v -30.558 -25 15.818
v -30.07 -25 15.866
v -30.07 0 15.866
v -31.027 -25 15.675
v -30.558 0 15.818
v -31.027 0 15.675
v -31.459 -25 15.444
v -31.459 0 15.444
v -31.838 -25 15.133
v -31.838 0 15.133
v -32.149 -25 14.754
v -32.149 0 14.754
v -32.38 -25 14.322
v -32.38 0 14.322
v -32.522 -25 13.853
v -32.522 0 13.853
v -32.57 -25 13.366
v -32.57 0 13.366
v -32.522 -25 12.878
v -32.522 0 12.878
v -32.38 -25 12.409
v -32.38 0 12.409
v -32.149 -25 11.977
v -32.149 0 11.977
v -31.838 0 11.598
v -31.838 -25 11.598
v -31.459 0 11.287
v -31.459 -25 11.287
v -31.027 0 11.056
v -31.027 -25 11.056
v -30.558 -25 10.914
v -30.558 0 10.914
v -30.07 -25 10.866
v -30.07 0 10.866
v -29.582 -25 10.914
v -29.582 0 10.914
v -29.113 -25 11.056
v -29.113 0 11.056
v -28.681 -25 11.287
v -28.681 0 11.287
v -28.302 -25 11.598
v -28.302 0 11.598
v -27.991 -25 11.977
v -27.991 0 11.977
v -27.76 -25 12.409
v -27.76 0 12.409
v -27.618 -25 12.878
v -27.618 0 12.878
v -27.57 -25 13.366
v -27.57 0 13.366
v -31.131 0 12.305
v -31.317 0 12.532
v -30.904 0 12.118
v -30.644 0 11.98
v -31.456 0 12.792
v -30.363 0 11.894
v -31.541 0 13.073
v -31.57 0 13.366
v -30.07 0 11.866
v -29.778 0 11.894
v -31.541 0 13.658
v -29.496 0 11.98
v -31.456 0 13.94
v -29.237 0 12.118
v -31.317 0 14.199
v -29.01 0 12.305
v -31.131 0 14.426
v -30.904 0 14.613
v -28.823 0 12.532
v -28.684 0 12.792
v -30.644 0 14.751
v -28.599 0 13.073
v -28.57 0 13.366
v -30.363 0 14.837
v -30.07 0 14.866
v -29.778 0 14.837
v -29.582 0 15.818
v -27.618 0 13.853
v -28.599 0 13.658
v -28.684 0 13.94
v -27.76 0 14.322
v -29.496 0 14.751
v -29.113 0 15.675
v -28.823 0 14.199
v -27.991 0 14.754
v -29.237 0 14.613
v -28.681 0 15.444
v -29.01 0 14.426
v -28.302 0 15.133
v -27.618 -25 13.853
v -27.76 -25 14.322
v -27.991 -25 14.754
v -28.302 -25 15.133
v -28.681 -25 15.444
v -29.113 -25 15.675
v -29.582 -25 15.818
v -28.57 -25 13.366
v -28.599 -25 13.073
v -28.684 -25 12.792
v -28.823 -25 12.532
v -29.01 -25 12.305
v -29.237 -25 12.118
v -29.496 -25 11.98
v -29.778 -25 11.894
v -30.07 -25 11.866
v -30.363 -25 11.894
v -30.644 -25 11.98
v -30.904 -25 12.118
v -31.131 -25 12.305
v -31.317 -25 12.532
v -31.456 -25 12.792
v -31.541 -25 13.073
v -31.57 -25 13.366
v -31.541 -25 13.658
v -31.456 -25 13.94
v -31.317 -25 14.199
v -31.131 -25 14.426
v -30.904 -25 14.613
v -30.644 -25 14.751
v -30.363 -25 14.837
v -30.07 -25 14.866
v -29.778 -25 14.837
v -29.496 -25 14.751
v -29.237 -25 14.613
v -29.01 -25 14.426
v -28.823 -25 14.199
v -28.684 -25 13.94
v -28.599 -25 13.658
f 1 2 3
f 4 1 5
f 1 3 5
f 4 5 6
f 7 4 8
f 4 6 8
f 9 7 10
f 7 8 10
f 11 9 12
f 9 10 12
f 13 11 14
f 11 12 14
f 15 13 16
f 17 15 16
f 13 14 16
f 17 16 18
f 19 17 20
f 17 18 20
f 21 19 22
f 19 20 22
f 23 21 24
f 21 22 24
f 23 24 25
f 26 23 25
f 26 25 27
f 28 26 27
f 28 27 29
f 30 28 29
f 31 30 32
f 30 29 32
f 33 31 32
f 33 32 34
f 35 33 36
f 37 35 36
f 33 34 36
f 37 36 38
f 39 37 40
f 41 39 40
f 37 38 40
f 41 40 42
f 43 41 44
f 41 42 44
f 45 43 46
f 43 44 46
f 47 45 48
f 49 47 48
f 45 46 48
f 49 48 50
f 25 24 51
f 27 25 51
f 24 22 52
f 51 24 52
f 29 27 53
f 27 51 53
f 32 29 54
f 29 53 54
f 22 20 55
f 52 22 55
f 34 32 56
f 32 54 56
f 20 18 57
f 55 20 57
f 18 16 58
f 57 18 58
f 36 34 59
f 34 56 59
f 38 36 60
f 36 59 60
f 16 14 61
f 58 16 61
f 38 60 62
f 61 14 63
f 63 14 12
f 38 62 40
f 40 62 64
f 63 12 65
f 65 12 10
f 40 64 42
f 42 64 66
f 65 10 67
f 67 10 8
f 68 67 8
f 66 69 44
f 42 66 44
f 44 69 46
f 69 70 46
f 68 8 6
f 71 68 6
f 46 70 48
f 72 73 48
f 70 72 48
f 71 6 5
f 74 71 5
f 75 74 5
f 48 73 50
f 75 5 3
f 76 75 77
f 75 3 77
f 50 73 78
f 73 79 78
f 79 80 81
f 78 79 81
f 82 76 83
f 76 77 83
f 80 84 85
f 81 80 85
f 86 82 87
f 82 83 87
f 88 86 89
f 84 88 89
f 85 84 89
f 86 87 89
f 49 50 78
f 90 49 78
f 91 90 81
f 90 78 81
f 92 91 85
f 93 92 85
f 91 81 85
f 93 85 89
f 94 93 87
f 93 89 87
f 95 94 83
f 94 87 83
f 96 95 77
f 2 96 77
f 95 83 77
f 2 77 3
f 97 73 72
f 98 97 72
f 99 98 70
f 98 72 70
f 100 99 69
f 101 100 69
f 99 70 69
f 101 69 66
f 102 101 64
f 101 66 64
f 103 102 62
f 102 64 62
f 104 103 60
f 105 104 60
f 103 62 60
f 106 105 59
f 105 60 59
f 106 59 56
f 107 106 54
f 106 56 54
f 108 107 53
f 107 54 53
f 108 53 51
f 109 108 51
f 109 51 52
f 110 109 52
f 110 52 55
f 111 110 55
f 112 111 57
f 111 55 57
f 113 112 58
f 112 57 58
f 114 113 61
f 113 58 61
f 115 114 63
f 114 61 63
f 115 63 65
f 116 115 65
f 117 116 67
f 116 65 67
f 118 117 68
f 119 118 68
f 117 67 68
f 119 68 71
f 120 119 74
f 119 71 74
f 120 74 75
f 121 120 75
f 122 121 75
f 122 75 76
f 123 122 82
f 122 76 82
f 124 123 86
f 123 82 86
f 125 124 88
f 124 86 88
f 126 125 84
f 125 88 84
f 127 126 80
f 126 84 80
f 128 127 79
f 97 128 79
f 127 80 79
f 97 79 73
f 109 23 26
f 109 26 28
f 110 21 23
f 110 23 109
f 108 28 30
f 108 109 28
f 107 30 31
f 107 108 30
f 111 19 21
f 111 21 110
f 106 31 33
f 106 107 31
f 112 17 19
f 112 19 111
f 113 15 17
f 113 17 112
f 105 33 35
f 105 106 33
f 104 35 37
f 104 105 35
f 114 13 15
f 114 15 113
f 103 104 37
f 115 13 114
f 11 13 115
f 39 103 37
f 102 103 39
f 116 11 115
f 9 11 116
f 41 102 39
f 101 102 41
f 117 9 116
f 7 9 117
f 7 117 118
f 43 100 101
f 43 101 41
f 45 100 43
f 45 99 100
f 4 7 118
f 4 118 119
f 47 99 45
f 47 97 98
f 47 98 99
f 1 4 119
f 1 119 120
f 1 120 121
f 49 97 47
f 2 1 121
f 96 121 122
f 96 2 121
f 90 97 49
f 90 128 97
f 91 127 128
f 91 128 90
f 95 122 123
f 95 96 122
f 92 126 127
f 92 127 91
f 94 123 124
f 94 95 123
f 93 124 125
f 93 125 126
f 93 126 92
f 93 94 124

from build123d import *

# Parameters (mm, degrees)
F1_DEPTH = 6
F2_DEPTH = 3
F3_DEPTH = 25
F4_DEPTH = 25


with BuildPart() as f1:
    # F0 (on Front) → F1 (new body)
    with BuildSketch(Plane.XZ):
        with BuildLine():
            ThreePointArc((-30.070162, 46.37237), (-35.632137, 46.568408), (-41.166509, 47.155549))
            ThreePointArc((-41.166509, 47.155549), (-30.070162, -22.199768), (-18.973814, 47.155549))
            ThreePointArc((-18.973814, 47.155549), (-24.508186, 46.568408), (-30.070162, 46.37237))
        make_face()
        with BuildLine():
            ThreePointArc((-22.570162, 13.365558), (-35.373463, 8.062257), (-30.070162, 20.865558))
            ThreePointArc((-30.070162, 20.865558), (-24.766861, 18.668859), (-22.570162, 13.365558))
        make_face(mode=Mode.SUBTRACT)
    extrude(amount=F1_DEPTH)

    # F0 (on Front) → F2 (join)
    with BuildSketch(Plane.XZ):
        with BuildLine():
            ThreePointArc((-30.070162, 56.279502), (-36.966771, 53.357463), (-41.166509, 47.155549))
            ThreePointArc((-41.166509, 47.155549), (-35.632137, 46.568408), (-30.070162, 46.37237))
            Line((-30.070162, 46.37237), (-30.070162, 50.721558))
            ThreePointArc((-30.070162, 50.721558), (-32.070162, 52.721558), (-30.070162, 54.721558))
            Line((-30.070162, 54.721558), (-30.070162, 56.279502))
        make_face()
        with BuildLine():
            ThreePointArc((-30.070162, 46.37237), (-24.508186, 46.568408), (-18.973814, 47.155549))
            ThreePointArc((-18.973814, 47.155549), (-23.173552, 53.357463), (-30.070162, 56.279502))
            Line((-30.070162, 56.279502), (-30.070162, 54.721558))
            ThreePointArc((-30.070162, 54.721558), (-28.655948, 54.135772), (-28.070162, 52.721558))
            ThreePointArc((-28.070162, 52.721558), (-28.655948, 51.307344), (-30.070162, 50.721558))
            Line((-30.070162, 50.721558), (-30.070162, 46.37237))
        make_face()
    extrude(amount=F2_DEPTH)


with BuildPart() as f3:
    # F0 (on Front) → F3 (new body)
    with BuildSketch(Plane.XZ):
        with BuildLine():
            ThreePointArc((-27.570162, 13.365558), (-28.302395, 15.133325), (-30.070162, 15.865558))
            ThreePointArc((-30.070162, 15.865558), (-31.837929, 11.597791), (-27.570162, 13.365558))
        make_face()
        with BuildLine():
            ThreePointArc((-28.570162, 13.365558), (-31.130822, 12.304898), (-30.070162, 14.865558))
            ThreePointArc((-30.070162, 14.865558), (-29.009502, 14.426218), (-28.570162, 13.365558))
        make_face(mode=Mode.SUBTRACT)
    extrude(amount=F3_DEPTH)


with BuildPart() as f4:
    # F0 (on Front) → F4 (new body)
    with BuildSketch(Plane.XZ):
        with BuildLine():
            ThreePointArc((-22.570162, 13.365558), (-24.766861, 18.668859), (-30.070162, 20.865558))
            ThreePointArc((-30.070162, 20.865558), (-35.373463, 8.062257), (-22.570162, 13.365558))
        make_face()
        with BuildLine():
            ThreePointArc((-27.570162, 13.365558), (-31.837929, 11.597791), (-30.070162, 15.865558))
            ThreePointArc((-30.070162, 15.865558), (-28.302395, 15.133325), (-27.570162, 13.365558))
        make_face(mode=Mode.SUBTRACT)
    extrude(amount=-F4_DEPTH)


solid = f3.part
